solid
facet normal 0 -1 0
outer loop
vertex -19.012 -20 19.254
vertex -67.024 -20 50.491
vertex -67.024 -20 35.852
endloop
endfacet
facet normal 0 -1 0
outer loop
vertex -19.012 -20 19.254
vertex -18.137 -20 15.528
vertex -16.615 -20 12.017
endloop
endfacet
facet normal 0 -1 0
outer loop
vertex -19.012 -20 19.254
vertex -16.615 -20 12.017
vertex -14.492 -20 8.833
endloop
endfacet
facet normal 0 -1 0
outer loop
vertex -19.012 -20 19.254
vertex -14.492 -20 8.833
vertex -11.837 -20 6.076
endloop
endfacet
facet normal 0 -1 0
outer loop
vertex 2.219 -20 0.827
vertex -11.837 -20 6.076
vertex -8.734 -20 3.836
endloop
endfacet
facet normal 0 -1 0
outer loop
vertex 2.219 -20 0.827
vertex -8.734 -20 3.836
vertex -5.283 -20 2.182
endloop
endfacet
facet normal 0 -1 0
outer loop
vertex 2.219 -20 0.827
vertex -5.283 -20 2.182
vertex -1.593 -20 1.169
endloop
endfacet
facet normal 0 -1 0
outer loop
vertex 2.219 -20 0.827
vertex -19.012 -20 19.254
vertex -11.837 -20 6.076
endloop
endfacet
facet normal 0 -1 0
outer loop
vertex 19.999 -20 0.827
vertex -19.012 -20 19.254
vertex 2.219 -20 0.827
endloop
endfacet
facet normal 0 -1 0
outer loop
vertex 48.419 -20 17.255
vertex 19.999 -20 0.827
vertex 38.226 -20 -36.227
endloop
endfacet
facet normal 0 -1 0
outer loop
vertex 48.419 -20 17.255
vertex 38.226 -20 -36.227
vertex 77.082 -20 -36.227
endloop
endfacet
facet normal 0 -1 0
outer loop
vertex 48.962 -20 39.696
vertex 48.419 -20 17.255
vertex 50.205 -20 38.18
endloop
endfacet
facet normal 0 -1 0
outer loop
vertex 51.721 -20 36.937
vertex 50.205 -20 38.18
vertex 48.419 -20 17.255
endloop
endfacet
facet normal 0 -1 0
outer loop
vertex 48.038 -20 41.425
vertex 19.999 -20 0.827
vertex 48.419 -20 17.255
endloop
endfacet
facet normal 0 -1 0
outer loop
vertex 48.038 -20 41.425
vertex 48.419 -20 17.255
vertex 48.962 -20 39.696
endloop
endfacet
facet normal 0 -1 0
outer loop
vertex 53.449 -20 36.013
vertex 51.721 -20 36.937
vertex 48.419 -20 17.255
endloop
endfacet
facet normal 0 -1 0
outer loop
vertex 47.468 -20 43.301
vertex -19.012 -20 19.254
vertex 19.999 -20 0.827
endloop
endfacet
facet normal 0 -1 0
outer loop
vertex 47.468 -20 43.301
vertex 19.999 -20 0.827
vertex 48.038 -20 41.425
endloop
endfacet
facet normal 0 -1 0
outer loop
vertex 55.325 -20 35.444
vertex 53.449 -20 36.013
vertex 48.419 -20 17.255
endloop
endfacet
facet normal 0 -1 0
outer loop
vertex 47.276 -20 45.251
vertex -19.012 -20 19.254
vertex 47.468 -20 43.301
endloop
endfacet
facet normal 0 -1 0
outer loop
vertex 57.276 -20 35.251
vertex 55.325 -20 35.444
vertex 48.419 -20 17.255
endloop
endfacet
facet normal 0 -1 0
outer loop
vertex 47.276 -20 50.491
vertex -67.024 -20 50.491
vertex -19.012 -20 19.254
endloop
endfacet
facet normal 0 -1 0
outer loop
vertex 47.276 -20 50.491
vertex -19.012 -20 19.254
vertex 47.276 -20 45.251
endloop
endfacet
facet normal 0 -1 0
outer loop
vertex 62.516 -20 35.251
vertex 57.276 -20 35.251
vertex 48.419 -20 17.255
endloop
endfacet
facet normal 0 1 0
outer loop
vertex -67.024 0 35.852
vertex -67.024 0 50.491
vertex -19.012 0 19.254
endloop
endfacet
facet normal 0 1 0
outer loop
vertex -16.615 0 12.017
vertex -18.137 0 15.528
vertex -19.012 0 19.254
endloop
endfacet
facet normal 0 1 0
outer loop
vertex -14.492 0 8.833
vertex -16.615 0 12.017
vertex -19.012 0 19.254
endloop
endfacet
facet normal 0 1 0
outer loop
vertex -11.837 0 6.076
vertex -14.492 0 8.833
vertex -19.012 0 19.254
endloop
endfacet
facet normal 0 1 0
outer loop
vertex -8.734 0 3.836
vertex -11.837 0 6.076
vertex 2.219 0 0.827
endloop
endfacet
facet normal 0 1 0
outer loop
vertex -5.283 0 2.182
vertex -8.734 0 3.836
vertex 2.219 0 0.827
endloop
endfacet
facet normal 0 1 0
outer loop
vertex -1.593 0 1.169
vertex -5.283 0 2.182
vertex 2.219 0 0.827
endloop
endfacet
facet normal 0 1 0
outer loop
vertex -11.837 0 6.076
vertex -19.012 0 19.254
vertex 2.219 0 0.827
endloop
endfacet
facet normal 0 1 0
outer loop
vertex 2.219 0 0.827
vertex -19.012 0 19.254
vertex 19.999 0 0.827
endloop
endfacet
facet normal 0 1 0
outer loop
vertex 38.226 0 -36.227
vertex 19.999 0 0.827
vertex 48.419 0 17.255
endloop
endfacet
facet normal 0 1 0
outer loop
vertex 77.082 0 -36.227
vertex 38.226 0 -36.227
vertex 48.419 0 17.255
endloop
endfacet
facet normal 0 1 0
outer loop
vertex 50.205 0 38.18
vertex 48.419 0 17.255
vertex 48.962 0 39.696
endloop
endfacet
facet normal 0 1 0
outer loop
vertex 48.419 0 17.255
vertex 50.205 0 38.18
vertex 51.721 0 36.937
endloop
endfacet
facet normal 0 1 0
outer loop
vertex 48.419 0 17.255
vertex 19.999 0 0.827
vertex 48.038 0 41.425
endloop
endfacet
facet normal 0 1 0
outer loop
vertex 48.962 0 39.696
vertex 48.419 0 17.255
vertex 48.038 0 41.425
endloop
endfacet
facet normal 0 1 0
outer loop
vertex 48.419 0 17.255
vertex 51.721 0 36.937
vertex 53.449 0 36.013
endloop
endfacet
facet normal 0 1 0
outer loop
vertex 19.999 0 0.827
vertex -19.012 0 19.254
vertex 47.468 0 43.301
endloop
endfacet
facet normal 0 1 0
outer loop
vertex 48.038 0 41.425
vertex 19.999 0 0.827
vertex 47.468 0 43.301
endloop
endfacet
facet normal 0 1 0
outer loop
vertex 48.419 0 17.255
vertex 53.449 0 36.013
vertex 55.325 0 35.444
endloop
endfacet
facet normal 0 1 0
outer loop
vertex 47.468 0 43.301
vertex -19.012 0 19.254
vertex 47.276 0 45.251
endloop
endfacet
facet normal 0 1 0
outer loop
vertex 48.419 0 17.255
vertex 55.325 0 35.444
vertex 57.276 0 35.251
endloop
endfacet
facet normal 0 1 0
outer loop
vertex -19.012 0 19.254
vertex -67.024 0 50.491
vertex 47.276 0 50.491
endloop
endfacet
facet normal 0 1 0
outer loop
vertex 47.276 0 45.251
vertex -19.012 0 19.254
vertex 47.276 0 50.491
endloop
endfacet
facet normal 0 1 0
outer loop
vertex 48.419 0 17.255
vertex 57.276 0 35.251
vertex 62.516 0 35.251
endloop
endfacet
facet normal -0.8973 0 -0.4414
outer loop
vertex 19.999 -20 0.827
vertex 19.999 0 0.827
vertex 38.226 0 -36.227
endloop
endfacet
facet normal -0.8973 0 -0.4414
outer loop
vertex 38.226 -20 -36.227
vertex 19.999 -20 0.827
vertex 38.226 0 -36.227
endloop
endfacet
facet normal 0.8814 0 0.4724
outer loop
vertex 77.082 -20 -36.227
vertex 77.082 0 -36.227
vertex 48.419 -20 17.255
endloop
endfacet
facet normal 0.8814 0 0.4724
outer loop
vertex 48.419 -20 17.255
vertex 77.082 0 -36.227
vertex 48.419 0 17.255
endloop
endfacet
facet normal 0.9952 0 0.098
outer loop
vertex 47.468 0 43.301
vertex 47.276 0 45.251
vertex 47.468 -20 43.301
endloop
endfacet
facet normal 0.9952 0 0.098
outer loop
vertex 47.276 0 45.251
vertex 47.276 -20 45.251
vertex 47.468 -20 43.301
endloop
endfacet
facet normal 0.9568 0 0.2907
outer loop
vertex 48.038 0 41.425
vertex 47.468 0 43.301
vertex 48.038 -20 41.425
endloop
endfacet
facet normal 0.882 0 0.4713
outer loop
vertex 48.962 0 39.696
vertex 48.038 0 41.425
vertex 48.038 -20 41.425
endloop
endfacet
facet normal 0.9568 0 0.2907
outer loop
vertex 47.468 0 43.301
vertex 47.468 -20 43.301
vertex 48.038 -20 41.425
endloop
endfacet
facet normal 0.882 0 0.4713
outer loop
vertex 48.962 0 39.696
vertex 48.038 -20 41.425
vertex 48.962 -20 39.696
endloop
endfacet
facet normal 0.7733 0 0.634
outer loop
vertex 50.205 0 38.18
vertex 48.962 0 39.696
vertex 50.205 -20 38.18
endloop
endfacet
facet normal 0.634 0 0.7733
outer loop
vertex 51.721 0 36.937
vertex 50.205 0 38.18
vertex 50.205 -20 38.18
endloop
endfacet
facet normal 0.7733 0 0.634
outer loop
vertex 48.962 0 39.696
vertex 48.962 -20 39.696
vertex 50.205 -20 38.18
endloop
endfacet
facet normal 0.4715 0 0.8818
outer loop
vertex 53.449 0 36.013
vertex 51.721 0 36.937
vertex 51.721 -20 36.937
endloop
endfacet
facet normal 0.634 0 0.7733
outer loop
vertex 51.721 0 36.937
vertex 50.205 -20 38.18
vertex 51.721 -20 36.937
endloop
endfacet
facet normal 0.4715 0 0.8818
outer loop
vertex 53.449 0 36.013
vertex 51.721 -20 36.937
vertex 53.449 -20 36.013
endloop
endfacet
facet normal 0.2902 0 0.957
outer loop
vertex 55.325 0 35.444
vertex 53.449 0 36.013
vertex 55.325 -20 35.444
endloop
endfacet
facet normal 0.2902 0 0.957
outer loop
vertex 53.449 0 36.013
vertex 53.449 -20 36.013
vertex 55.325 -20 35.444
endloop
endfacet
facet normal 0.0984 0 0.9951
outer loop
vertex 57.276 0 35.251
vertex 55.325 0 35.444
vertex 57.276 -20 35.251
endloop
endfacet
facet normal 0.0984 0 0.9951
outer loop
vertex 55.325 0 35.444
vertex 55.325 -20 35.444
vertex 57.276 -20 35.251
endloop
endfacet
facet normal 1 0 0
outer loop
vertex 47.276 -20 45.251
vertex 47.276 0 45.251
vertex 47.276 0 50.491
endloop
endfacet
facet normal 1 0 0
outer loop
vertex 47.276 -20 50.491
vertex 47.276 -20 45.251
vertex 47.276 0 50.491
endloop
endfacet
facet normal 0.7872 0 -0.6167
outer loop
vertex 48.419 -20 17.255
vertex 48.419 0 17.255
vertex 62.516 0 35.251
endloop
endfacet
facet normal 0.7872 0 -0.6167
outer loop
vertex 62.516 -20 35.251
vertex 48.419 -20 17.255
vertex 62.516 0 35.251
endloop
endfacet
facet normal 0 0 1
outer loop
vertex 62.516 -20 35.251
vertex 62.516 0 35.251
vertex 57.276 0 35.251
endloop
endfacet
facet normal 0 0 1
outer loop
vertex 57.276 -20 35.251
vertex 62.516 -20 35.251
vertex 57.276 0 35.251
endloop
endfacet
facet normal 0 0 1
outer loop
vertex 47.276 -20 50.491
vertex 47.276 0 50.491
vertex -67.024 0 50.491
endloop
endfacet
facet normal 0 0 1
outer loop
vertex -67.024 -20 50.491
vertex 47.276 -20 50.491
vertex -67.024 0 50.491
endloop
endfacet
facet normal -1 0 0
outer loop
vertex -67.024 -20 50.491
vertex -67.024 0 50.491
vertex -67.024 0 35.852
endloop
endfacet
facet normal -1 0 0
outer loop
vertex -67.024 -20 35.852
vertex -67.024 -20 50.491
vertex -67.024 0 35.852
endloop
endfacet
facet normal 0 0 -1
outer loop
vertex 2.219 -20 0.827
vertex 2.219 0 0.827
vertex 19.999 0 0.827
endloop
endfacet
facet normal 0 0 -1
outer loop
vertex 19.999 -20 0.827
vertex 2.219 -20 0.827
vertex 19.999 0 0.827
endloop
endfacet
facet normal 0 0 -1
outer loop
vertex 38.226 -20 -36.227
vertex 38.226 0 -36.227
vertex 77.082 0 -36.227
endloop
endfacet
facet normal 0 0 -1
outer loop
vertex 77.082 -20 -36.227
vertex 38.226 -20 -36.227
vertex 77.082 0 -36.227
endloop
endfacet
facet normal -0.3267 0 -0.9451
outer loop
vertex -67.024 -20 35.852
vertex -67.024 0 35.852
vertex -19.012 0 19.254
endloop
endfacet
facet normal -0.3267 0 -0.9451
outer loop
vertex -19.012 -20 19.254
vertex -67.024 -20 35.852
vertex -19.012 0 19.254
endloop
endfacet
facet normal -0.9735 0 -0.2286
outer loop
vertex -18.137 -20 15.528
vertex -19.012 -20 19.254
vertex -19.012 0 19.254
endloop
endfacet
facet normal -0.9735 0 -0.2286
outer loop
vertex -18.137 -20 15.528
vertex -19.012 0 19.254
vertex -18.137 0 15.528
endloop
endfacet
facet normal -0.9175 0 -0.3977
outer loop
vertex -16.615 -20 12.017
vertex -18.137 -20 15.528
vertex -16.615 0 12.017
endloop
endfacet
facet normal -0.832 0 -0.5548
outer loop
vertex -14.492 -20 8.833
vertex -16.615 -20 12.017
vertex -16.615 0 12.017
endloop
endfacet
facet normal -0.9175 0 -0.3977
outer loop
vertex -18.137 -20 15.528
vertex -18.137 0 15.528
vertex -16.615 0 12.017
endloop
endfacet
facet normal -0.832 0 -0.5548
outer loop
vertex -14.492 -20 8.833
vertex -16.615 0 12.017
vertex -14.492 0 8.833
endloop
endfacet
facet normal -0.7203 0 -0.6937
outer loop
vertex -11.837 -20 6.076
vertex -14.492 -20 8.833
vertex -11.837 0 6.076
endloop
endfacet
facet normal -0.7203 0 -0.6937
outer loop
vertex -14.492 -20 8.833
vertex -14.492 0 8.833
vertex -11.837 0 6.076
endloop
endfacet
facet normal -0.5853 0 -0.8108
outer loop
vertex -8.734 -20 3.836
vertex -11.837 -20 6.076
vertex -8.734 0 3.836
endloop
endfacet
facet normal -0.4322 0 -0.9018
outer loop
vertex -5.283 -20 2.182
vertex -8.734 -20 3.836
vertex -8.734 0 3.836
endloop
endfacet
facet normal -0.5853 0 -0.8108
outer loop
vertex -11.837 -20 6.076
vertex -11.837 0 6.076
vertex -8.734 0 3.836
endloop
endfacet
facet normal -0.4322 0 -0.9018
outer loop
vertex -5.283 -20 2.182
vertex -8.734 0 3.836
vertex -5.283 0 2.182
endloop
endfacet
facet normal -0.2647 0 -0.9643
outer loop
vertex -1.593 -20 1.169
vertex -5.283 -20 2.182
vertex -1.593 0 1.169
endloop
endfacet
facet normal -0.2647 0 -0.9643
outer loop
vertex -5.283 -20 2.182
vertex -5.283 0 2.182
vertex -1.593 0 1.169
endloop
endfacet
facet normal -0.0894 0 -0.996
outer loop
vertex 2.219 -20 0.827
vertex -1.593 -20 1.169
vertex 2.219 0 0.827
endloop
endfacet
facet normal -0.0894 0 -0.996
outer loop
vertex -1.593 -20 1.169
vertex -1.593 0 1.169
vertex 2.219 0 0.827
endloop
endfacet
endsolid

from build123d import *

# Parameters (mm, degrees)
F1_DEPTH = 20
F2_R     = 10


with BuildPart() as f1:
    # F0 (on Front) → F1 (new body)
    with BuildSketch(Plane.XZ):
        with BuildLine():
            Line((47.276331, 35.251416), (47.276331, 50.491416))
            Line((47.276331, 50.491416), (-67.023669, 50.491416))
            Line((-67.023669, 50.491416), (-67.023669, 35.852298))
            Line((-67.023669, 35.852298), (-19.011813, 19.254055))
            ThreePointArc((-19.011813, 19.254055), (-11.837012, 6.076339), (2.219168, 0.827168))
            Line((2.219168, 0.827168), (19.999168, 0.827168))
            Line((19.999168, 0.827168), (38.225762, -36.226879))
            Line((38.225762, -36.226879), (77.082462, -36.226879))
            Line((77.082462, -36.226879), (48.419438, 17.255383))
            Line((48.419438, 17.255383), (62.516331, 35.251416))
            Line((62.516331, 35.251416), (47.276331, 35.251416))
        make_face()
    extrude(amount=F1_DEPTH)

    # F2
    f2_edges = [f1.edges().sort_by_distance(p)[0] for p in [
        (47.276331, -10, 35.251416),
    ]]
    fillet(f2_edges, radius=F2_R)


solid = f1.part
